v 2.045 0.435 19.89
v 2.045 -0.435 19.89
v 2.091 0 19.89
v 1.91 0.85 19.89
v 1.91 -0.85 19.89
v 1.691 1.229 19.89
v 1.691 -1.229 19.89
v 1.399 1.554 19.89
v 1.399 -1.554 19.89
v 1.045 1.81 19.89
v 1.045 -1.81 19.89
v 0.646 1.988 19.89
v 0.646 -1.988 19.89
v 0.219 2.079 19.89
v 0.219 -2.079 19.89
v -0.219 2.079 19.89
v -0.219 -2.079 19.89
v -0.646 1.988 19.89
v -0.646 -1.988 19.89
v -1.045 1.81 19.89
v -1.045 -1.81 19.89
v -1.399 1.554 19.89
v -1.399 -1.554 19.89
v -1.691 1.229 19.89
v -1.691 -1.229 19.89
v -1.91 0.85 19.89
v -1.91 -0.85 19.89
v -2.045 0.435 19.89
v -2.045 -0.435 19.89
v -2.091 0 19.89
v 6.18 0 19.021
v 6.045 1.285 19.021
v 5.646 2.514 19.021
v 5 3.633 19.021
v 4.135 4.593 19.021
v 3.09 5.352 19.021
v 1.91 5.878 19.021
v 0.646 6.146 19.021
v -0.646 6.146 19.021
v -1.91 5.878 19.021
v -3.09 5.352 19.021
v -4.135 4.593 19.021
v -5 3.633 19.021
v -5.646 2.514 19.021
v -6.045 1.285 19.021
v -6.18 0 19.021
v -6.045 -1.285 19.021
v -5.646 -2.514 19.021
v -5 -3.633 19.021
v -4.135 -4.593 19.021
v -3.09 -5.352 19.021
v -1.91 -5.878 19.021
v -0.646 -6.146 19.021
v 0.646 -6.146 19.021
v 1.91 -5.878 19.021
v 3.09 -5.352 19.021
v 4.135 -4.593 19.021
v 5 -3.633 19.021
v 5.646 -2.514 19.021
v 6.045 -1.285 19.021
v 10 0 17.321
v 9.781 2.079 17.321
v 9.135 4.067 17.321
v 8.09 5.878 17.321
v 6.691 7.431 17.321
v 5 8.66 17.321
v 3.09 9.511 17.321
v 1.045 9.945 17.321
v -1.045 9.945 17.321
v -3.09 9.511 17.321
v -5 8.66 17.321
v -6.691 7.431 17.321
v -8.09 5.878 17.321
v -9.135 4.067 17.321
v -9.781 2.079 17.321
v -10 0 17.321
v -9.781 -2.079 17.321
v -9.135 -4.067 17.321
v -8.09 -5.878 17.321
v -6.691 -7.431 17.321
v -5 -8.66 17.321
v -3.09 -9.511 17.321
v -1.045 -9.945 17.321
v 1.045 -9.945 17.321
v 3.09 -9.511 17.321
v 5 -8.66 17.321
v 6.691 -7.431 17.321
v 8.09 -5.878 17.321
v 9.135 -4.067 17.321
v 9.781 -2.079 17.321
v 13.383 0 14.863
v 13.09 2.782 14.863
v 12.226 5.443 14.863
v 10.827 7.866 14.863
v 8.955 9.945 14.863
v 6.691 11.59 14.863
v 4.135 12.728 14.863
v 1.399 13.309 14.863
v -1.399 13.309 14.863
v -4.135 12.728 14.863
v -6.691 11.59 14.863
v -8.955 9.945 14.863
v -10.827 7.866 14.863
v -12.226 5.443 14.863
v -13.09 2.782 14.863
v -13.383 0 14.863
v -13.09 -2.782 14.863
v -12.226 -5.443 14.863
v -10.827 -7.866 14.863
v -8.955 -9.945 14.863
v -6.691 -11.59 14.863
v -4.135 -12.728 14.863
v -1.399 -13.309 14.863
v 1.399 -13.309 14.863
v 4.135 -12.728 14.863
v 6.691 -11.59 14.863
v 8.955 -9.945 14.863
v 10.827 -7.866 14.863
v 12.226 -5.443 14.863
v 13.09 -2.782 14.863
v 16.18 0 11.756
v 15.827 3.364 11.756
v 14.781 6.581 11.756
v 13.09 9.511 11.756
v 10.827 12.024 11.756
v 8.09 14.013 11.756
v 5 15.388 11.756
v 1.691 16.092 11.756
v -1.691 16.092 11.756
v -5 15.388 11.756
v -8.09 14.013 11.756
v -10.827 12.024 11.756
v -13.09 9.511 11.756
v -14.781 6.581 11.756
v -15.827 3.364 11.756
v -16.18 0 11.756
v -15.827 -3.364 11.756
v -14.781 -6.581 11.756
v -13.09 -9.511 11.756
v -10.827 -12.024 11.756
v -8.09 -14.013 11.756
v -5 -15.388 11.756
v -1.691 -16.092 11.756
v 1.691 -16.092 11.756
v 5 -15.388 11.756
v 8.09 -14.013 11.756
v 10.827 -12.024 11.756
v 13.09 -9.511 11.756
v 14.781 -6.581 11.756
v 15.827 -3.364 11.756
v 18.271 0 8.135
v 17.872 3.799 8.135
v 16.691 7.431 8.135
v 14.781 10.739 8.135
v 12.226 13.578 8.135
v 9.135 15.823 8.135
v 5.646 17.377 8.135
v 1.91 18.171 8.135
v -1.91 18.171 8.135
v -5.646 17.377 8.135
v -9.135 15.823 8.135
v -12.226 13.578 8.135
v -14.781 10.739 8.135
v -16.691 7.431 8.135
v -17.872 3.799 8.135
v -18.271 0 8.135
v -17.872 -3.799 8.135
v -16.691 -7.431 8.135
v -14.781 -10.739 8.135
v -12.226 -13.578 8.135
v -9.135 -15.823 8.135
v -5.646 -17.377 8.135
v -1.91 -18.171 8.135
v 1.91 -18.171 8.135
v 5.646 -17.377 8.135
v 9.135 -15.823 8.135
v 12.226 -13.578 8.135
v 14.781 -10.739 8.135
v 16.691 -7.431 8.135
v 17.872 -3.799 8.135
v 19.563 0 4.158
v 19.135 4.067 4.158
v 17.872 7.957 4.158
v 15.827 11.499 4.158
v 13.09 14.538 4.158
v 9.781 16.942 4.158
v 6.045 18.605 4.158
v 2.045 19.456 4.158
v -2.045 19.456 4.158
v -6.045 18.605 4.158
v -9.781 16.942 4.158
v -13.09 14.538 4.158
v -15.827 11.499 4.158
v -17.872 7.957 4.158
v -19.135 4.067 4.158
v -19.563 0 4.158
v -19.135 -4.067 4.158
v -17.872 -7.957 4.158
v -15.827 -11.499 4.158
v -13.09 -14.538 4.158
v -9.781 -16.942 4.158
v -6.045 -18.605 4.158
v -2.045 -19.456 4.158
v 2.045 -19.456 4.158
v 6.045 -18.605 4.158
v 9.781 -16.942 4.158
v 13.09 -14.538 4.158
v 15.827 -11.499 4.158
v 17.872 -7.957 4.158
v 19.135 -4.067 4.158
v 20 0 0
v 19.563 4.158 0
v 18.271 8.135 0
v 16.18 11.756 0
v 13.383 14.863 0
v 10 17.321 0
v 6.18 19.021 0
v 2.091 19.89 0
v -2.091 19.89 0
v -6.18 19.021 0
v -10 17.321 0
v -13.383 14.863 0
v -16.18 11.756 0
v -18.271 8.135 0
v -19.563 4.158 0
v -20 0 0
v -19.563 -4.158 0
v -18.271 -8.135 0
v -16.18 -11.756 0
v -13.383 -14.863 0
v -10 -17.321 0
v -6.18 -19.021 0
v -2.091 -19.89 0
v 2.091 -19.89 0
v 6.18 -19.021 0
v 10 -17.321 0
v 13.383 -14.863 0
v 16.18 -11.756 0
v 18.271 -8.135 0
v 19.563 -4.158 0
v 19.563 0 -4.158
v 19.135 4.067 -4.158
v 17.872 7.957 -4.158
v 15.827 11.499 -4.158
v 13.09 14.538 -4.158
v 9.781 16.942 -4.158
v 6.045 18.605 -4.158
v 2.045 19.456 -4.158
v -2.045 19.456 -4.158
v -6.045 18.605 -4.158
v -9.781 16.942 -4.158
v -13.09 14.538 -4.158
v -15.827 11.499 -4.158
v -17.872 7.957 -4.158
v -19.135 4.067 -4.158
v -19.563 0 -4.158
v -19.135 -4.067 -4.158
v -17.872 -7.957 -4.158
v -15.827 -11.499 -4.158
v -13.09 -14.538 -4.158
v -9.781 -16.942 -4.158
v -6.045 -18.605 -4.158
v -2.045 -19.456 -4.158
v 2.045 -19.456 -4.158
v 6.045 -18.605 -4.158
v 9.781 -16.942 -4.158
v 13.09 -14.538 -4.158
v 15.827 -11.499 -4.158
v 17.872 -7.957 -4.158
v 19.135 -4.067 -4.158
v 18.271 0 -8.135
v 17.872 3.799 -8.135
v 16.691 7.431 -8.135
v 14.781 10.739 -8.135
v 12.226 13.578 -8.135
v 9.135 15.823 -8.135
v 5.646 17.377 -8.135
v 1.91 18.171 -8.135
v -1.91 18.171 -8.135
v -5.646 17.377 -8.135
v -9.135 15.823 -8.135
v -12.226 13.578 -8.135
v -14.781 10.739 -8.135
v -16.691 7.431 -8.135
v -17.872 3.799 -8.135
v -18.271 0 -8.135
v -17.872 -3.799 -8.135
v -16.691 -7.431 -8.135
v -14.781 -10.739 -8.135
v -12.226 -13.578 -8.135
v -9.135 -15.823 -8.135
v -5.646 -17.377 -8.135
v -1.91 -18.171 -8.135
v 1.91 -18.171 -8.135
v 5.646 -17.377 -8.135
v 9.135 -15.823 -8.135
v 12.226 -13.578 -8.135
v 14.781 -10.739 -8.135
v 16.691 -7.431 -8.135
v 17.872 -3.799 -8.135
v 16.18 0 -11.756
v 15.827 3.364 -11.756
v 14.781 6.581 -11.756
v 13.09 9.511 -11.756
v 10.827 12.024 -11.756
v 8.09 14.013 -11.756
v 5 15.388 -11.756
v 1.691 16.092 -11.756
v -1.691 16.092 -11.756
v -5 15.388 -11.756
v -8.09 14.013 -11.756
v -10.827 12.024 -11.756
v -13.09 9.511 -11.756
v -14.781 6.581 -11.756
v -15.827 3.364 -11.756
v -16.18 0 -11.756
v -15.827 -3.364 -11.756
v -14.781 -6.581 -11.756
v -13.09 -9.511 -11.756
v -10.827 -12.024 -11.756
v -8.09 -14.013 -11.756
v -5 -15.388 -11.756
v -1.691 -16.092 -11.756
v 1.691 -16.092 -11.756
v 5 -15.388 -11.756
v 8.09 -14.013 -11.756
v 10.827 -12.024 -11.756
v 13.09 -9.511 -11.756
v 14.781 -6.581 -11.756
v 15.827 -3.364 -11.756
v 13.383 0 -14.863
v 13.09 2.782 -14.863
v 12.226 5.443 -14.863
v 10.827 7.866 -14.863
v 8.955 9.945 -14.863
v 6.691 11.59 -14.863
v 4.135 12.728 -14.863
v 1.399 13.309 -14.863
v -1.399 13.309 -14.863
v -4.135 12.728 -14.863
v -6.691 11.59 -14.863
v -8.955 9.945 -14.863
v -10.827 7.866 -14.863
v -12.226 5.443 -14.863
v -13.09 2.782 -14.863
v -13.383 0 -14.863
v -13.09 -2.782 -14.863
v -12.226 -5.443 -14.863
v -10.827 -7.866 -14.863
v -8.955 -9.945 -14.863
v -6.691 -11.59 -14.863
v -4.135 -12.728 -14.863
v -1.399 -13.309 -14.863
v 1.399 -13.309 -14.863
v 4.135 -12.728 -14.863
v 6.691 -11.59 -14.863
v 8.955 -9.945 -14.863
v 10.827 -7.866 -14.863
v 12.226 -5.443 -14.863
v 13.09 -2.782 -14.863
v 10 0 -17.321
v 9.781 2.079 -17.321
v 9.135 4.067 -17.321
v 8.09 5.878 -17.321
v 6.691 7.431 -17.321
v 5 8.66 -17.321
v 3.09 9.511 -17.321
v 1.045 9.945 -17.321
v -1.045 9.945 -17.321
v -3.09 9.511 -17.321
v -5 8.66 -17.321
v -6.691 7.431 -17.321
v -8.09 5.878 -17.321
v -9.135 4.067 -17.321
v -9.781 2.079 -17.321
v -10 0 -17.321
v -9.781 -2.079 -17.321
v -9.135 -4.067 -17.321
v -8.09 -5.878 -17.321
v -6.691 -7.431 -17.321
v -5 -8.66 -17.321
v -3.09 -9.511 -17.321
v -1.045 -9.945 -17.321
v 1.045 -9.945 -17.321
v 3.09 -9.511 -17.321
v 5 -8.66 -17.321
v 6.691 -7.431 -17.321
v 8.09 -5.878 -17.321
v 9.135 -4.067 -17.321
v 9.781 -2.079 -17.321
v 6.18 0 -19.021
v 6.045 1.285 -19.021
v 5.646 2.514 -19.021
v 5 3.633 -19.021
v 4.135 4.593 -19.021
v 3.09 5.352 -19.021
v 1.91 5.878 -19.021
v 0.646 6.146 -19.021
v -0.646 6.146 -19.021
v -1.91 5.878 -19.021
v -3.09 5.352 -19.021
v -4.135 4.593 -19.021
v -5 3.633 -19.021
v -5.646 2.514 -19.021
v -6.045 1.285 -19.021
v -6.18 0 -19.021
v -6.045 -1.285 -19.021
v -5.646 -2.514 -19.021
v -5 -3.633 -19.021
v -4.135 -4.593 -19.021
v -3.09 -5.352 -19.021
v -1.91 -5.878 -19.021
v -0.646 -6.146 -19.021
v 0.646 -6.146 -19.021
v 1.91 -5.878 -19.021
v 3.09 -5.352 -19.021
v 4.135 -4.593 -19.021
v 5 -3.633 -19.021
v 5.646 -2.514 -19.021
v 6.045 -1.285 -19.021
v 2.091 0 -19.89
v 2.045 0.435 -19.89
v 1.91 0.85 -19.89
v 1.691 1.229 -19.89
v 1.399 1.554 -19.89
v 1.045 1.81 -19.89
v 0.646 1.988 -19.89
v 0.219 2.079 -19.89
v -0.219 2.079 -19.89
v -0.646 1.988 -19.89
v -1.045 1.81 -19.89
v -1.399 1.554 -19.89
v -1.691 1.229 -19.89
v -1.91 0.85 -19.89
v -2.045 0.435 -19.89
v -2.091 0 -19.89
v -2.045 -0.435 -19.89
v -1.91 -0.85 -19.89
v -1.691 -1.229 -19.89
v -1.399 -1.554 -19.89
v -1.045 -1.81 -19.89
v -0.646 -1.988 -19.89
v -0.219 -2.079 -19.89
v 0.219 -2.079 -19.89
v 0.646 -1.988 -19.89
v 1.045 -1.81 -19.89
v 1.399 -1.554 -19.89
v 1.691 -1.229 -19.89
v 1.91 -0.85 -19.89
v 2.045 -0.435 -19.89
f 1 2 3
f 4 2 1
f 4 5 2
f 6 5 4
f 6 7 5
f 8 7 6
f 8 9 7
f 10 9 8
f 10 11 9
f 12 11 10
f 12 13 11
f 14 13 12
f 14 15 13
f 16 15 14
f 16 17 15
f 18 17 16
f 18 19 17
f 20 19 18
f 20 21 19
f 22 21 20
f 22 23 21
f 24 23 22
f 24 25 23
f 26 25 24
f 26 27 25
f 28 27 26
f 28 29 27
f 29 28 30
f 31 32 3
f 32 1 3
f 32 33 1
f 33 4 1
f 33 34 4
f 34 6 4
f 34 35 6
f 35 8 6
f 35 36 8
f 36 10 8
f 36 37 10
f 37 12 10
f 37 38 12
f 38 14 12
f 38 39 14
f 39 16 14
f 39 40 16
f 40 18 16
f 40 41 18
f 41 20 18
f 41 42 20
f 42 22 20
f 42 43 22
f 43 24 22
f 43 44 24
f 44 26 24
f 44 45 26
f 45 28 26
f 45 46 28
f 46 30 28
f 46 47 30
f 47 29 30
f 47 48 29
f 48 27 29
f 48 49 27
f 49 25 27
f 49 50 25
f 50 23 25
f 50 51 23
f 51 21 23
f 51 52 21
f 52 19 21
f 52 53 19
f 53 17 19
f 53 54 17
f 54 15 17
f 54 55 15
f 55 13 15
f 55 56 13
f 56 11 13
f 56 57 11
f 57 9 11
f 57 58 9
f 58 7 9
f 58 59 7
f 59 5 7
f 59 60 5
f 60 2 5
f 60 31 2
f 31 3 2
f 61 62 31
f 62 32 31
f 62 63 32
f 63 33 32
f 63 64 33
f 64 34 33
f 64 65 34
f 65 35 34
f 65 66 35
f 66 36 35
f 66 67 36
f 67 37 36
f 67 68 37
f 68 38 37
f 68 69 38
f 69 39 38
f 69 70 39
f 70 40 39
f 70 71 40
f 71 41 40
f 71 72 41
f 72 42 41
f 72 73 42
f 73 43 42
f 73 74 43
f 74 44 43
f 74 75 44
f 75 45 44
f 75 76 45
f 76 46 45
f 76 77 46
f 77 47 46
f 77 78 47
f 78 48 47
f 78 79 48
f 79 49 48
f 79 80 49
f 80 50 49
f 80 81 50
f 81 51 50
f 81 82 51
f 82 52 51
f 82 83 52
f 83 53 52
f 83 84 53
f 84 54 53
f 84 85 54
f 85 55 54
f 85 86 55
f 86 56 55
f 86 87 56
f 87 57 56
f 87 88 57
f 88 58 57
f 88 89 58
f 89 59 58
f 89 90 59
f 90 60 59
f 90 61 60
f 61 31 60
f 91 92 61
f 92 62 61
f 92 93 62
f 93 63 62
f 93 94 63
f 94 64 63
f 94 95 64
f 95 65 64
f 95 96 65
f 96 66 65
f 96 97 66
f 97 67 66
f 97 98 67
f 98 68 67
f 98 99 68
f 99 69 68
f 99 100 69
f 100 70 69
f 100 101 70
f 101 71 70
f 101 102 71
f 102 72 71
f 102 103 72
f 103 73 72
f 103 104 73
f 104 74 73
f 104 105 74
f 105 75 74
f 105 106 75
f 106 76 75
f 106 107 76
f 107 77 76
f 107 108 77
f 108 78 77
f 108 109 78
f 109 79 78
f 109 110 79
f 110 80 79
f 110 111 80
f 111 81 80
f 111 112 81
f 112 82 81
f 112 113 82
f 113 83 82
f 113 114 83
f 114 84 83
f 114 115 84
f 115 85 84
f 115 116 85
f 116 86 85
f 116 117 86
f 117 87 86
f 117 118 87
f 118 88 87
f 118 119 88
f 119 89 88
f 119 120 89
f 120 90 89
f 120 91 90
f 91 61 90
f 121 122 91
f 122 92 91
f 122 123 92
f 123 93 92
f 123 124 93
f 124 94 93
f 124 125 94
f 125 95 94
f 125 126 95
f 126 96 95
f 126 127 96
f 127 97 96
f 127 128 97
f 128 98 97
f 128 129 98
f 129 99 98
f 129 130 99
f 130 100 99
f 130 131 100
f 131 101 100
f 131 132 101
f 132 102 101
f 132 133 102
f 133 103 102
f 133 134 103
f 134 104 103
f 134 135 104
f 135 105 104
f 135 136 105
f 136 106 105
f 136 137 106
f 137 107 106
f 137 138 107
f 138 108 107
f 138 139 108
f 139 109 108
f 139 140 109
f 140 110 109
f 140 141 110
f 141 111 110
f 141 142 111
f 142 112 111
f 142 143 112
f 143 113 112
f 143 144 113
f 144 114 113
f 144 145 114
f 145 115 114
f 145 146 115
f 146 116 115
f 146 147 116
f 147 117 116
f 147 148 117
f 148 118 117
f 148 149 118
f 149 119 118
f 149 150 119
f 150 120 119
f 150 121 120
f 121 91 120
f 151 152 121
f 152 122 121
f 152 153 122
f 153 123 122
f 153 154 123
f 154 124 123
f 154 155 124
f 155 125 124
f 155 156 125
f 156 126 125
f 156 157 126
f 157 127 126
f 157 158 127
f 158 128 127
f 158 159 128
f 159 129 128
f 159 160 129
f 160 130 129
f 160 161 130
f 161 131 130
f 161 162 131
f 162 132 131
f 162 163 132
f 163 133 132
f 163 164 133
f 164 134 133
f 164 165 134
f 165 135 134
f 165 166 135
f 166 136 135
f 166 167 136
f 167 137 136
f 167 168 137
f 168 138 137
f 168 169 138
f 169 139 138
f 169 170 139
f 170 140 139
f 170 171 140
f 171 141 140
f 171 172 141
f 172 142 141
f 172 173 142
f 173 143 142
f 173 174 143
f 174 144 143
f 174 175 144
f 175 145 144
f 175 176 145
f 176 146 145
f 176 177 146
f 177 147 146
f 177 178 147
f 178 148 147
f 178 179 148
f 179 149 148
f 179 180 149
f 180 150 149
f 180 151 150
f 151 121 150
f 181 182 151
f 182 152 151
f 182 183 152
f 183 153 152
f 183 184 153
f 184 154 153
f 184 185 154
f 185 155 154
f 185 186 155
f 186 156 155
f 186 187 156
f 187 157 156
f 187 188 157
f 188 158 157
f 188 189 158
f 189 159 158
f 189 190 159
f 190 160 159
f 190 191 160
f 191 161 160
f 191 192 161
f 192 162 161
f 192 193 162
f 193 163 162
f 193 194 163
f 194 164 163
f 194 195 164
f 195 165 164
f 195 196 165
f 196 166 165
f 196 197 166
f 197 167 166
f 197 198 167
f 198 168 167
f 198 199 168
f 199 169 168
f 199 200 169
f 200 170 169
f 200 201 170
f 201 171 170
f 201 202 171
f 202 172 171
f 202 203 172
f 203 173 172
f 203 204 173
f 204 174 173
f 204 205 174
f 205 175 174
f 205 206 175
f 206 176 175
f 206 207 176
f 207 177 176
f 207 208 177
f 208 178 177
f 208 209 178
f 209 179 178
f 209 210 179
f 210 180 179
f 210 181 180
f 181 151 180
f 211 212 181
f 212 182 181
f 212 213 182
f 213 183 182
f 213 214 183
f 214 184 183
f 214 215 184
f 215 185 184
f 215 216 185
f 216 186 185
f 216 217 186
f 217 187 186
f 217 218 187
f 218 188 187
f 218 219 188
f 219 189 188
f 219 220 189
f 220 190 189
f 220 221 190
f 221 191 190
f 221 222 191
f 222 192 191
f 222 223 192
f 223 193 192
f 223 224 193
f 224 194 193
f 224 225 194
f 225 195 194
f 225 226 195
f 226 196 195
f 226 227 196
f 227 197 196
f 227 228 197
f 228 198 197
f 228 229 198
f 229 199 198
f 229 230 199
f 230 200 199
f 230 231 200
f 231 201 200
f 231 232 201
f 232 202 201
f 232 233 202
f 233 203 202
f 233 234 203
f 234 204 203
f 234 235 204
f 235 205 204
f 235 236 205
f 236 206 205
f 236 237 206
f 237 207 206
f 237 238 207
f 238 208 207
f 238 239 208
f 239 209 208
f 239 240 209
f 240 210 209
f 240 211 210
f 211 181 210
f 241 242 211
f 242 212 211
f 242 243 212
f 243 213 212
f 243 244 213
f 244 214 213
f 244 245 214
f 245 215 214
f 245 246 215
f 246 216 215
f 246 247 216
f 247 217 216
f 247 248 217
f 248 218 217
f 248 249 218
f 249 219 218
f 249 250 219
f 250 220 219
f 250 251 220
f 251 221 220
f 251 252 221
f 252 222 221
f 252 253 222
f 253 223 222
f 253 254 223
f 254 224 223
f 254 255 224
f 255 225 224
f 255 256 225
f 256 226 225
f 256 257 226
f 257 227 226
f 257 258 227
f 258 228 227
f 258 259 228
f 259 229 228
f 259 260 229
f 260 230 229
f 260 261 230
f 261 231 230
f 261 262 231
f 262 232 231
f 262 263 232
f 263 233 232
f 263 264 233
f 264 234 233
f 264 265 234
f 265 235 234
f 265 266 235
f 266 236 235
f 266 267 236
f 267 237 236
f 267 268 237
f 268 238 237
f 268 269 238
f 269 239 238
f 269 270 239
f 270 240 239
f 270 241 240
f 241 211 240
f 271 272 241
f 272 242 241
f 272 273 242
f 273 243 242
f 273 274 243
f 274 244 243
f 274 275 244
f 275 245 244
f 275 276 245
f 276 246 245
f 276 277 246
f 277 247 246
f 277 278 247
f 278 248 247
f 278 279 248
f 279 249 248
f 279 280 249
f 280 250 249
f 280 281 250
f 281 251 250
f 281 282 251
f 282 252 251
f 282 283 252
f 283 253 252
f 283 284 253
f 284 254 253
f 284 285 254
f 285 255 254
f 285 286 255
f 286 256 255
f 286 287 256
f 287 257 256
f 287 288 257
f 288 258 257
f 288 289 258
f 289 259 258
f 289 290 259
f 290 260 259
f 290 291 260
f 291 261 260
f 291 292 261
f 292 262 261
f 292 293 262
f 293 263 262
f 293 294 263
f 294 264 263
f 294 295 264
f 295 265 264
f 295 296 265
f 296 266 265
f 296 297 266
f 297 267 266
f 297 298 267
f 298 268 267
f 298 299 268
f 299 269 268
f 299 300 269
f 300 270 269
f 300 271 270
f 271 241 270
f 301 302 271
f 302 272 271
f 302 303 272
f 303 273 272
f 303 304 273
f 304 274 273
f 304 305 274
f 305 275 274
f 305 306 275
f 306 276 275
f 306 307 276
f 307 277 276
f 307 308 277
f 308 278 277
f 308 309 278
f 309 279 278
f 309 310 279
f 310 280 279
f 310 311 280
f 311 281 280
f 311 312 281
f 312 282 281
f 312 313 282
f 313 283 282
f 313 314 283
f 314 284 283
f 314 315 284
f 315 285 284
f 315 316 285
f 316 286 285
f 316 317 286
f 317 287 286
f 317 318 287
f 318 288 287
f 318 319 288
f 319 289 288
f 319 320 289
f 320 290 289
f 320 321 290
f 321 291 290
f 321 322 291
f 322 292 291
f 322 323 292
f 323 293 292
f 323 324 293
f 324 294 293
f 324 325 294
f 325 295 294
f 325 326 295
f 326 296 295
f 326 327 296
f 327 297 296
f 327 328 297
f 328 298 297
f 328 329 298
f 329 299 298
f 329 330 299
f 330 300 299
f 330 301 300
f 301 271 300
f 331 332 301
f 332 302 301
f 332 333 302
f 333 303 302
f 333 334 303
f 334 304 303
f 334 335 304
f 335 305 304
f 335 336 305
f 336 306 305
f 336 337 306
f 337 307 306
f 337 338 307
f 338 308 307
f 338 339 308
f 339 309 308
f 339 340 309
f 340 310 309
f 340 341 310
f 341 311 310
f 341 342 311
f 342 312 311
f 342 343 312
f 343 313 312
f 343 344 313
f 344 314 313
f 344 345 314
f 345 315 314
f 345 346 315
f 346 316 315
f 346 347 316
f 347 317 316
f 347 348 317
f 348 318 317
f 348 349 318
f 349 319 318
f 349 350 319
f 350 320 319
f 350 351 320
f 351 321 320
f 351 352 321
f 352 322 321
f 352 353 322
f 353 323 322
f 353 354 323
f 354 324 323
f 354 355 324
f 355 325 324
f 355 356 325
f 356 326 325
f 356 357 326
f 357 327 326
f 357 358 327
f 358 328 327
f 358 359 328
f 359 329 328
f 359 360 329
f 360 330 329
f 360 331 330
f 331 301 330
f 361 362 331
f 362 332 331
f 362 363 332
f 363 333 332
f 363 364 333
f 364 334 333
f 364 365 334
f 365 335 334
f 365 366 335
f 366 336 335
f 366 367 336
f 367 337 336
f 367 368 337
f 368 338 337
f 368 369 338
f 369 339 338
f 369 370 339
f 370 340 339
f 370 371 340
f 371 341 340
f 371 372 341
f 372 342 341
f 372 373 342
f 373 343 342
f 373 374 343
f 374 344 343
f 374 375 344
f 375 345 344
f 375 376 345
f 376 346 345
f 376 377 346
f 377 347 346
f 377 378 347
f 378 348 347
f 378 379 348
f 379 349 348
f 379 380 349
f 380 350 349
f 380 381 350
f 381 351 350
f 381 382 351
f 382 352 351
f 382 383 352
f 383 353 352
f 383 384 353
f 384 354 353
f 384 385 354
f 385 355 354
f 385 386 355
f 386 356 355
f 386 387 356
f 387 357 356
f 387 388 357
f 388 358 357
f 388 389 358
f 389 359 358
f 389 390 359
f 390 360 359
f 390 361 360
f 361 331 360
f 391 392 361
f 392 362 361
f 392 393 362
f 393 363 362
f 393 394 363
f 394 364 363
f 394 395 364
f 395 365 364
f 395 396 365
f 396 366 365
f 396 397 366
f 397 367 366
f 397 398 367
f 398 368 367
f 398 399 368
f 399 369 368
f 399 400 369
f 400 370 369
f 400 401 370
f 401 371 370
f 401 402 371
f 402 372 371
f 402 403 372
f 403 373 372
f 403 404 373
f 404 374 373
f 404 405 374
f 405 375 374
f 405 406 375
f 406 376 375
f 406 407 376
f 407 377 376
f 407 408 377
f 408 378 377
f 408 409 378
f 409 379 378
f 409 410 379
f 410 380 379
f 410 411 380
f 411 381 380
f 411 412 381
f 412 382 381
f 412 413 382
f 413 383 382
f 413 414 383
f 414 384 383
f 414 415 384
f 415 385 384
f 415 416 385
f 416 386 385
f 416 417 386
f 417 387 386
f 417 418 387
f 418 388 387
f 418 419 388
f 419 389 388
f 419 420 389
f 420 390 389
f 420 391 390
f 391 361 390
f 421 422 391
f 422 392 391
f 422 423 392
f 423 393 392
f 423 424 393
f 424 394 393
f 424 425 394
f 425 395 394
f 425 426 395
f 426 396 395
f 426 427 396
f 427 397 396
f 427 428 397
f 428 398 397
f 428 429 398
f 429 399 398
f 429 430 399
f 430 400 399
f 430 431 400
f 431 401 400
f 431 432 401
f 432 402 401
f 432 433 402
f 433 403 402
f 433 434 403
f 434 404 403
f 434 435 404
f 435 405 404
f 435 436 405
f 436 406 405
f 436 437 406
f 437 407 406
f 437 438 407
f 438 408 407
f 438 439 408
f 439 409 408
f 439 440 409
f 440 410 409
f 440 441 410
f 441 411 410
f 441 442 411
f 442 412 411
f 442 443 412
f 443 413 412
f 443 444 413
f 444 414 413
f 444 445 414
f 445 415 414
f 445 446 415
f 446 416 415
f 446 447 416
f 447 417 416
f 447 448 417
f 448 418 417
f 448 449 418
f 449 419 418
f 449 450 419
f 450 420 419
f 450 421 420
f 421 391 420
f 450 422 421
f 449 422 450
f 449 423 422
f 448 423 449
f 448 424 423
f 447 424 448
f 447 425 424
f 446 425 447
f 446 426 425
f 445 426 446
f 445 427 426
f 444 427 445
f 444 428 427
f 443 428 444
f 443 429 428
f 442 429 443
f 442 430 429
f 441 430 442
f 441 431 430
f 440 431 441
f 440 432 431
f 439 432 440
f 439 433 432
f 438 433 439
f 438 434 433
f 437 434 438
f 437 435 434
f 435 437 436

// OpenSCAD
// Unit of length: Unit.INCH
sphere(r = 20.0, $fa = 12.0, $fs = 2.0, $fn = 0);
